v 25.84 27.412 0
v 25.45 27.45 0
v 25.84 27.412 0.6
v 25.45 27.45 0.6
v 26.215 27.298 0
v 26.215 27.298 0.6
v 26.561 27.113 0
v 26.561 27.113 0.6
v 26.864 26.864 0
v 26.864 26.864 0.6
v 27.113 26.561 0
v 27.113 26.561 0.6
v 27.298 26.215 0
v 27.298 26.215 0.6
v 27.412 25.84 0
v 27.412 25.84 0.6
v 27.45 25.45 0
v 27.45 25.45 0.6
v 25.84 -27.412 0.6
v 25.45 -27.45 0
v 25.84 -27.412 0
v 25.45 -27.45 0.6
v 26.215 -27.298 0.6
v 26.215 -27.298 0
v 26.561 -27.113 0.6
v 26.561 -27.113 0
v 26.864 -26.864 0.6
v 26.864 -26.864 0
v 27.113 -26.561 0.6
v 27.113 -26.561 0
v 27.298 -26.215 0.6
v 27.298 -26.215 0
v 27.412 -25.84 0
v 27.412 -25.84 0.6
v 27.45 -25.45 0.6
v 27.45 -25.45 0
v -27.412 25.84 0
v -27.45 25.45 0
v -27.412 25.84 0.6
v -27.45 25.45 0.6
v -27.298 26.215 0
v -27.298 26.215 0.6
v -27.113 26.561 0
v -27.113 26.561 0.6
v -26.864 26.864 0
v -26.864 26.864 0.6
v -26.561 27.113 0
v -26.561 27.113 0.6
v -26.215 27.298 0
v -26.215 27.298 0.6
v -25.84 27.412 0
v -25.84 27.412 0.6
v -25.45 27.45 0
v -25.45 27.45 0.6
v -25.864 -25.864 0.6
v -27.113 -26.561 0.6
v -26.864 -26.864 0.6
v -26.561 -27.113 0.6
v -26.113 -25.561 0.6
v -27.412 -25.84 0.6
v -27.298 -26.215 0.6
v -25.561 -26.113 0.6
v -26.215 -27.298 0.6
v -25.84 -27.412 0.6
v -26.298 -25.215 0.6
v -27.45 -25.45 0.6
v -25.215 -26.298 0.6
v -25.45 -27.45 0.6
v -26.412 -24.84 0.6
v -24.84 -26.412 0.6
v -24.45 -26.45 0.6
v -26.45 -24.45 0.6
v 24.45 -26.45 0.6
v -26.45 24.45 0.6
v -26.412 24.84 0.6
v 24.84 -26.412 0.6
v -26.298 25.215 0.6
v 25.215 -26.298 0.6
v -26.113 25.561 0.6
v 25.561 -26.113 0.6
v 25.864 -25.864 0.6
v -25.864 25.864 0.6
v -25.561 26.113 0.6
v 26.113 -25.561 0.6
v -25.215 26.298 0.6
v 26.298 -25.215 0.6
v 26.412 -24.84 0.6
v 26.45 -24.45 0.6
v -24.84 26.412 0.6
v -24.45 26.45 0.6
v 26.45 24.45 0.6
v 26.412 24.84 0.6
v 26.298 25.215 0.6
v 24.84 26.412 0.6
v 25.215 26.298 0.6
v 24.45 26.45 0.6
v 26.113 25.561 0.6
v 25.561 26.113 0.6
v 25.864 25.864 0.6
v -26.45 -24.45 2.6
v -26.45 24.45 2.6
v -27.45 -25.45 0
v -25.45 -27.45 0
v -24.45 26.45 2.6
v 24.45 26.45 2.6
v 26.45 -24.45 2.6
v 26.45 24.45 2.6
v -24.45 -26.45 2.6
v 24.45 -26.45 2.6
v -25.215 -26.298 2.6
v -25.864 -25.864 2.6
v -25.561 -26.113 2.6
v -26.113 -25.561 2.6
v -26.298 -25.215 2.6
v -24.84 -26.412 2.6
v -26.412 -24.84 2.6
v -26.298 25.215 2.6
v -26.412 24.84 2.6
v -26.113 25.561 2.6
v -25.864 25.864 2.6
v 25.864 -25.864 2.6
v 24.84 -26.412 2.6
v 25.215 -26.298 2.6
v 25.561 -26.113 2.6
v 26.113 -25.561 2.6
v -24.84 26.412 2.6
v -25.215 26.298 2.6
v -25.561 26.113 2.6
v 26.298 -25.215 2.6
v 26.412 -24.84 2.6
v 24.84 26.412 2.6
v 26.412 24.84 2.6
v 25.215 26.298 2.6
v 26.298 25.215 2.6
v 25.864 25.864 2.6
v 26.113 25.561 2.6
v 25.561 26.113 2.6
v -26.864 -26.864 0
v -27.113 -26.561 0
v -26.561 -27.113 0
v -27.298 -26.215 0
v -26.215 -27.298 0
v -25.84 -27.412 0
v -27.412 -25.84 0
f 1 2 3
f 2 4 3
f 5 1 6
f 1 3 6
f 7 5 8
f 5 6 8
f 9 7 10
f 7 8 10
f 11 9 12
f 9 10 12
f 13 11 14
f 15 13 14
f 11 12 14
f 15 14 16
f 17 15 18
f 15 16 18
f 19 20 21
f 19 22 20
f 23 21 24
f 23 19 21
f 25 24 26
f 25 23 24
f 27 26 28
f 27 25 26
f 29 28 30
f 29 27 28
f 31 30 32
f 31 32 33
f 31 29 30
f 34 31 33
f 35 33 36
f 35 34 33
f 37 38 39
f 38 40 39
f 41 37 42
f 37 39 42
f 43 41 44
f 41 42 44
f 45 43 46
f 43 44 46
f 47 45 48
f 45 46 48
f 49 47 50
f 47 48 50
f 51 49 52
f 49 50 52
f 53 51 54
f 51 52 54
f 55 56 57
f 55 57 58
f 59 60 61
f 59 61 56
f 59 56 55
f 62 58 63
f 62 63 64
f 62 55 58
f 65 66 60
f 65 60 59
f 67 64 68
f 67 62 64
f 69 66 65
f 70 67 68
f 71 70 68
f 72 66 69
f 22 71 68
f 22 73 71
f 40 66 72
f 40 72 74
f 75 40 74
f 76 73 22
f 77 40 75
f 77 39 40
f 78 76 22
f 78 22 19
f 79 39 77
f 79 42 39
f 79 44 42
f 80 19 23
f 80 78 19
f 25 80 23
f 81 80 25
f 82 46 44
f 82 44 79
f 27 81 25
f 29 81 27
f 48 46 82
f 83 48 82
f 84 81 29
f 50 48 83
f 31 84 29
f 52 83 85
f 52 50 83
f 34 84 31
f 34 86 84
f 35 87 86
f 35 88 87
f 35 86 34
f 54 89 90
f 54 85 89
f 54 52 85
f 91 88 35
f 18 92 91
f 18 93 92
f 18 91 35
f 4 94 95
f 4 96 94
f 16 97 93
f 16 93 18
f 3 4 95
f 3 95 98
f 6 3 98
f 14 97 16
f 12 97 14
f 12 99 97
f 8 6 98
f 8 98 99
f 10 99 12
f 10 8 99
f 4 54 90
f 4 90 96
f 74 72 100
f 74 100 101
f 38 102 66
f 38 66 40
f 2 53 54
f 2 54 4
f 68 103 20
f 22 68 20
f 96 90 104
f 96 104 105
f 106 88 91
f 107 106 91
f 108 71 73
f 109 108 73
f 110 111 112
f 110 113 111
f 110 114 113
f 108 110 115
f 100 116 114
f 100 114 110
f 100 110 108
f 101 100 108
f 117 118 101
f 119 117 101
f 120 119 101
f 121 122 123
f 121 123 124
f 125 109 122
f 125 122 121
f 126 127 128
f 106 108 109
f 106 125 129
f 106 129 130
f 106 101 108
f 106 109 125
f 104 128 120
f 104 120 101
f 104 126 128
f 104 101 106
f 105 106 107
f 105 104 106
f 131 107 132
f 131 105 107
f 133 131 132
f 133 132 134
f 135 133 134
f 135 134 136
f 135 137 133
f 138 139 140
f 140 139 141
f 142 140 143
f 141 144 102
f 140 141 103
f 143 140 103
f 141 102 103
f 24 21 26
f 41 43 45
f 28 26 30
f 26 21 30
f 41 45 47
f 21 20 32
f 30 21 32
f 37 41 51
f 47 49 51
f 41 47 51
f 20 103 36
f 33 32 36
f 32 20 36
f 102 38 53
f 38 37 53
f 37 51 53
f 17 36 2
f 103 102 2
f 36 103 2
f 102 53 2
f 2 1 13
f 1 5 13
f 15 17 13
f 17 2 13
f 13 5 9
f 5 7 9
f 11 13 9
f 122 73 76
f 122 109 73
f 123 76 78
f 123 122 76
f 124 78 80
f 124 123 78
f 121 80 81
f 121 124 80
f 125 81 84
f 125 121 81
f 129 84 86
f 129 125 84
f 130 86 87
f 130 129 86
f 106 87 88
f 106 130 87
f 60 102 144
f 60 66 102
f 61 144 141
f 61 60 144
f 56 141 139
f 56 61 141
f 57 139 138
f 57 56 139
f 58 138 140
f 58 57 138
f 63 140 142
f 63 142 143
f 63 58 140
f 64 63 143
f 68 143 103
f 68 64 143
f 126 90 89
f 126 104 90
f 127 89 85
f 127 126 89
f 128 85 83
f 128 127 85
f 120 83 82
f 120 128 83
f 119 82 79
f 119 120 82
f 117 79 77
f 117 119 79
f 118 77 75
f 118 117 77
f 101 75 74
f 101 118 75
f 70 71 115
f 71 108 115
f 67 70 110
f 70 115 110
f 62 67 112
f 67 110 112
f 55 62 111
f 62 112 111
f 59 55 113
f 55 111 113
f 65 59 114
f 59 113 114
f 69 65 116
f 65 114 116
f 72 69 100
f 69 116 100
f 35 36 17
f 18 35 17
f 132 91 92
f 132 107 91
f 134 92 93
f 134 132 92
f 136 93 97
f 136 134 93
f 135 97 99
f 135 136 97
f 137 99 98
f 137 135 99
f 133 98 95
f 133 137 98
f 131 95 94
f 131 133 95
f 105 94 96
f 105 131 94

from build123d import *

# Parameters (mm, degrees)
F0_W     = 52.9
F0_H     = 52.9
F1_DEPTH = 2.6
F0_W_2   = 54.9
F0_H_2   = 54.9
F2_DEPTH = 0.6
F3_R     = 2


with BuildPart() as f1:
    # F0 (on Top) → F1 (new body)
    with BuildSketch(Plane.XY):
        Rectangle(F0_W, F0_H)
    extrude(amount=F1_DEPTH)

    # F0 (on Top) → F2 (join)
    with BuildSketch(Plane.XY):
        Rectangle(F0_W_2, F0_H_2)
        Rectangle(F0_W, F0_H, mode=Mode.SUBTRACT)
    extrude(amount=F2_DEPTH)

    # F3
    f3_edges = [f1.edges().sort_by_distance(p)[0] for p in [
        (-26.45, -26.45, 1.6),
        (26.45, -26.45, 1.6),
        (-26.45, 26.45, 1.6),
        (26.45, 26.45, 1.6),
        (-27.45, 27.45, 0.3),
        (-27.45, -27.45, 0.3),
        (27.45, -27.45, 0.3),
        (27.45, 27.45, 0.3),
    ]]
    fillet(f3_edges, radius=F3_R)


solid = f1.part
